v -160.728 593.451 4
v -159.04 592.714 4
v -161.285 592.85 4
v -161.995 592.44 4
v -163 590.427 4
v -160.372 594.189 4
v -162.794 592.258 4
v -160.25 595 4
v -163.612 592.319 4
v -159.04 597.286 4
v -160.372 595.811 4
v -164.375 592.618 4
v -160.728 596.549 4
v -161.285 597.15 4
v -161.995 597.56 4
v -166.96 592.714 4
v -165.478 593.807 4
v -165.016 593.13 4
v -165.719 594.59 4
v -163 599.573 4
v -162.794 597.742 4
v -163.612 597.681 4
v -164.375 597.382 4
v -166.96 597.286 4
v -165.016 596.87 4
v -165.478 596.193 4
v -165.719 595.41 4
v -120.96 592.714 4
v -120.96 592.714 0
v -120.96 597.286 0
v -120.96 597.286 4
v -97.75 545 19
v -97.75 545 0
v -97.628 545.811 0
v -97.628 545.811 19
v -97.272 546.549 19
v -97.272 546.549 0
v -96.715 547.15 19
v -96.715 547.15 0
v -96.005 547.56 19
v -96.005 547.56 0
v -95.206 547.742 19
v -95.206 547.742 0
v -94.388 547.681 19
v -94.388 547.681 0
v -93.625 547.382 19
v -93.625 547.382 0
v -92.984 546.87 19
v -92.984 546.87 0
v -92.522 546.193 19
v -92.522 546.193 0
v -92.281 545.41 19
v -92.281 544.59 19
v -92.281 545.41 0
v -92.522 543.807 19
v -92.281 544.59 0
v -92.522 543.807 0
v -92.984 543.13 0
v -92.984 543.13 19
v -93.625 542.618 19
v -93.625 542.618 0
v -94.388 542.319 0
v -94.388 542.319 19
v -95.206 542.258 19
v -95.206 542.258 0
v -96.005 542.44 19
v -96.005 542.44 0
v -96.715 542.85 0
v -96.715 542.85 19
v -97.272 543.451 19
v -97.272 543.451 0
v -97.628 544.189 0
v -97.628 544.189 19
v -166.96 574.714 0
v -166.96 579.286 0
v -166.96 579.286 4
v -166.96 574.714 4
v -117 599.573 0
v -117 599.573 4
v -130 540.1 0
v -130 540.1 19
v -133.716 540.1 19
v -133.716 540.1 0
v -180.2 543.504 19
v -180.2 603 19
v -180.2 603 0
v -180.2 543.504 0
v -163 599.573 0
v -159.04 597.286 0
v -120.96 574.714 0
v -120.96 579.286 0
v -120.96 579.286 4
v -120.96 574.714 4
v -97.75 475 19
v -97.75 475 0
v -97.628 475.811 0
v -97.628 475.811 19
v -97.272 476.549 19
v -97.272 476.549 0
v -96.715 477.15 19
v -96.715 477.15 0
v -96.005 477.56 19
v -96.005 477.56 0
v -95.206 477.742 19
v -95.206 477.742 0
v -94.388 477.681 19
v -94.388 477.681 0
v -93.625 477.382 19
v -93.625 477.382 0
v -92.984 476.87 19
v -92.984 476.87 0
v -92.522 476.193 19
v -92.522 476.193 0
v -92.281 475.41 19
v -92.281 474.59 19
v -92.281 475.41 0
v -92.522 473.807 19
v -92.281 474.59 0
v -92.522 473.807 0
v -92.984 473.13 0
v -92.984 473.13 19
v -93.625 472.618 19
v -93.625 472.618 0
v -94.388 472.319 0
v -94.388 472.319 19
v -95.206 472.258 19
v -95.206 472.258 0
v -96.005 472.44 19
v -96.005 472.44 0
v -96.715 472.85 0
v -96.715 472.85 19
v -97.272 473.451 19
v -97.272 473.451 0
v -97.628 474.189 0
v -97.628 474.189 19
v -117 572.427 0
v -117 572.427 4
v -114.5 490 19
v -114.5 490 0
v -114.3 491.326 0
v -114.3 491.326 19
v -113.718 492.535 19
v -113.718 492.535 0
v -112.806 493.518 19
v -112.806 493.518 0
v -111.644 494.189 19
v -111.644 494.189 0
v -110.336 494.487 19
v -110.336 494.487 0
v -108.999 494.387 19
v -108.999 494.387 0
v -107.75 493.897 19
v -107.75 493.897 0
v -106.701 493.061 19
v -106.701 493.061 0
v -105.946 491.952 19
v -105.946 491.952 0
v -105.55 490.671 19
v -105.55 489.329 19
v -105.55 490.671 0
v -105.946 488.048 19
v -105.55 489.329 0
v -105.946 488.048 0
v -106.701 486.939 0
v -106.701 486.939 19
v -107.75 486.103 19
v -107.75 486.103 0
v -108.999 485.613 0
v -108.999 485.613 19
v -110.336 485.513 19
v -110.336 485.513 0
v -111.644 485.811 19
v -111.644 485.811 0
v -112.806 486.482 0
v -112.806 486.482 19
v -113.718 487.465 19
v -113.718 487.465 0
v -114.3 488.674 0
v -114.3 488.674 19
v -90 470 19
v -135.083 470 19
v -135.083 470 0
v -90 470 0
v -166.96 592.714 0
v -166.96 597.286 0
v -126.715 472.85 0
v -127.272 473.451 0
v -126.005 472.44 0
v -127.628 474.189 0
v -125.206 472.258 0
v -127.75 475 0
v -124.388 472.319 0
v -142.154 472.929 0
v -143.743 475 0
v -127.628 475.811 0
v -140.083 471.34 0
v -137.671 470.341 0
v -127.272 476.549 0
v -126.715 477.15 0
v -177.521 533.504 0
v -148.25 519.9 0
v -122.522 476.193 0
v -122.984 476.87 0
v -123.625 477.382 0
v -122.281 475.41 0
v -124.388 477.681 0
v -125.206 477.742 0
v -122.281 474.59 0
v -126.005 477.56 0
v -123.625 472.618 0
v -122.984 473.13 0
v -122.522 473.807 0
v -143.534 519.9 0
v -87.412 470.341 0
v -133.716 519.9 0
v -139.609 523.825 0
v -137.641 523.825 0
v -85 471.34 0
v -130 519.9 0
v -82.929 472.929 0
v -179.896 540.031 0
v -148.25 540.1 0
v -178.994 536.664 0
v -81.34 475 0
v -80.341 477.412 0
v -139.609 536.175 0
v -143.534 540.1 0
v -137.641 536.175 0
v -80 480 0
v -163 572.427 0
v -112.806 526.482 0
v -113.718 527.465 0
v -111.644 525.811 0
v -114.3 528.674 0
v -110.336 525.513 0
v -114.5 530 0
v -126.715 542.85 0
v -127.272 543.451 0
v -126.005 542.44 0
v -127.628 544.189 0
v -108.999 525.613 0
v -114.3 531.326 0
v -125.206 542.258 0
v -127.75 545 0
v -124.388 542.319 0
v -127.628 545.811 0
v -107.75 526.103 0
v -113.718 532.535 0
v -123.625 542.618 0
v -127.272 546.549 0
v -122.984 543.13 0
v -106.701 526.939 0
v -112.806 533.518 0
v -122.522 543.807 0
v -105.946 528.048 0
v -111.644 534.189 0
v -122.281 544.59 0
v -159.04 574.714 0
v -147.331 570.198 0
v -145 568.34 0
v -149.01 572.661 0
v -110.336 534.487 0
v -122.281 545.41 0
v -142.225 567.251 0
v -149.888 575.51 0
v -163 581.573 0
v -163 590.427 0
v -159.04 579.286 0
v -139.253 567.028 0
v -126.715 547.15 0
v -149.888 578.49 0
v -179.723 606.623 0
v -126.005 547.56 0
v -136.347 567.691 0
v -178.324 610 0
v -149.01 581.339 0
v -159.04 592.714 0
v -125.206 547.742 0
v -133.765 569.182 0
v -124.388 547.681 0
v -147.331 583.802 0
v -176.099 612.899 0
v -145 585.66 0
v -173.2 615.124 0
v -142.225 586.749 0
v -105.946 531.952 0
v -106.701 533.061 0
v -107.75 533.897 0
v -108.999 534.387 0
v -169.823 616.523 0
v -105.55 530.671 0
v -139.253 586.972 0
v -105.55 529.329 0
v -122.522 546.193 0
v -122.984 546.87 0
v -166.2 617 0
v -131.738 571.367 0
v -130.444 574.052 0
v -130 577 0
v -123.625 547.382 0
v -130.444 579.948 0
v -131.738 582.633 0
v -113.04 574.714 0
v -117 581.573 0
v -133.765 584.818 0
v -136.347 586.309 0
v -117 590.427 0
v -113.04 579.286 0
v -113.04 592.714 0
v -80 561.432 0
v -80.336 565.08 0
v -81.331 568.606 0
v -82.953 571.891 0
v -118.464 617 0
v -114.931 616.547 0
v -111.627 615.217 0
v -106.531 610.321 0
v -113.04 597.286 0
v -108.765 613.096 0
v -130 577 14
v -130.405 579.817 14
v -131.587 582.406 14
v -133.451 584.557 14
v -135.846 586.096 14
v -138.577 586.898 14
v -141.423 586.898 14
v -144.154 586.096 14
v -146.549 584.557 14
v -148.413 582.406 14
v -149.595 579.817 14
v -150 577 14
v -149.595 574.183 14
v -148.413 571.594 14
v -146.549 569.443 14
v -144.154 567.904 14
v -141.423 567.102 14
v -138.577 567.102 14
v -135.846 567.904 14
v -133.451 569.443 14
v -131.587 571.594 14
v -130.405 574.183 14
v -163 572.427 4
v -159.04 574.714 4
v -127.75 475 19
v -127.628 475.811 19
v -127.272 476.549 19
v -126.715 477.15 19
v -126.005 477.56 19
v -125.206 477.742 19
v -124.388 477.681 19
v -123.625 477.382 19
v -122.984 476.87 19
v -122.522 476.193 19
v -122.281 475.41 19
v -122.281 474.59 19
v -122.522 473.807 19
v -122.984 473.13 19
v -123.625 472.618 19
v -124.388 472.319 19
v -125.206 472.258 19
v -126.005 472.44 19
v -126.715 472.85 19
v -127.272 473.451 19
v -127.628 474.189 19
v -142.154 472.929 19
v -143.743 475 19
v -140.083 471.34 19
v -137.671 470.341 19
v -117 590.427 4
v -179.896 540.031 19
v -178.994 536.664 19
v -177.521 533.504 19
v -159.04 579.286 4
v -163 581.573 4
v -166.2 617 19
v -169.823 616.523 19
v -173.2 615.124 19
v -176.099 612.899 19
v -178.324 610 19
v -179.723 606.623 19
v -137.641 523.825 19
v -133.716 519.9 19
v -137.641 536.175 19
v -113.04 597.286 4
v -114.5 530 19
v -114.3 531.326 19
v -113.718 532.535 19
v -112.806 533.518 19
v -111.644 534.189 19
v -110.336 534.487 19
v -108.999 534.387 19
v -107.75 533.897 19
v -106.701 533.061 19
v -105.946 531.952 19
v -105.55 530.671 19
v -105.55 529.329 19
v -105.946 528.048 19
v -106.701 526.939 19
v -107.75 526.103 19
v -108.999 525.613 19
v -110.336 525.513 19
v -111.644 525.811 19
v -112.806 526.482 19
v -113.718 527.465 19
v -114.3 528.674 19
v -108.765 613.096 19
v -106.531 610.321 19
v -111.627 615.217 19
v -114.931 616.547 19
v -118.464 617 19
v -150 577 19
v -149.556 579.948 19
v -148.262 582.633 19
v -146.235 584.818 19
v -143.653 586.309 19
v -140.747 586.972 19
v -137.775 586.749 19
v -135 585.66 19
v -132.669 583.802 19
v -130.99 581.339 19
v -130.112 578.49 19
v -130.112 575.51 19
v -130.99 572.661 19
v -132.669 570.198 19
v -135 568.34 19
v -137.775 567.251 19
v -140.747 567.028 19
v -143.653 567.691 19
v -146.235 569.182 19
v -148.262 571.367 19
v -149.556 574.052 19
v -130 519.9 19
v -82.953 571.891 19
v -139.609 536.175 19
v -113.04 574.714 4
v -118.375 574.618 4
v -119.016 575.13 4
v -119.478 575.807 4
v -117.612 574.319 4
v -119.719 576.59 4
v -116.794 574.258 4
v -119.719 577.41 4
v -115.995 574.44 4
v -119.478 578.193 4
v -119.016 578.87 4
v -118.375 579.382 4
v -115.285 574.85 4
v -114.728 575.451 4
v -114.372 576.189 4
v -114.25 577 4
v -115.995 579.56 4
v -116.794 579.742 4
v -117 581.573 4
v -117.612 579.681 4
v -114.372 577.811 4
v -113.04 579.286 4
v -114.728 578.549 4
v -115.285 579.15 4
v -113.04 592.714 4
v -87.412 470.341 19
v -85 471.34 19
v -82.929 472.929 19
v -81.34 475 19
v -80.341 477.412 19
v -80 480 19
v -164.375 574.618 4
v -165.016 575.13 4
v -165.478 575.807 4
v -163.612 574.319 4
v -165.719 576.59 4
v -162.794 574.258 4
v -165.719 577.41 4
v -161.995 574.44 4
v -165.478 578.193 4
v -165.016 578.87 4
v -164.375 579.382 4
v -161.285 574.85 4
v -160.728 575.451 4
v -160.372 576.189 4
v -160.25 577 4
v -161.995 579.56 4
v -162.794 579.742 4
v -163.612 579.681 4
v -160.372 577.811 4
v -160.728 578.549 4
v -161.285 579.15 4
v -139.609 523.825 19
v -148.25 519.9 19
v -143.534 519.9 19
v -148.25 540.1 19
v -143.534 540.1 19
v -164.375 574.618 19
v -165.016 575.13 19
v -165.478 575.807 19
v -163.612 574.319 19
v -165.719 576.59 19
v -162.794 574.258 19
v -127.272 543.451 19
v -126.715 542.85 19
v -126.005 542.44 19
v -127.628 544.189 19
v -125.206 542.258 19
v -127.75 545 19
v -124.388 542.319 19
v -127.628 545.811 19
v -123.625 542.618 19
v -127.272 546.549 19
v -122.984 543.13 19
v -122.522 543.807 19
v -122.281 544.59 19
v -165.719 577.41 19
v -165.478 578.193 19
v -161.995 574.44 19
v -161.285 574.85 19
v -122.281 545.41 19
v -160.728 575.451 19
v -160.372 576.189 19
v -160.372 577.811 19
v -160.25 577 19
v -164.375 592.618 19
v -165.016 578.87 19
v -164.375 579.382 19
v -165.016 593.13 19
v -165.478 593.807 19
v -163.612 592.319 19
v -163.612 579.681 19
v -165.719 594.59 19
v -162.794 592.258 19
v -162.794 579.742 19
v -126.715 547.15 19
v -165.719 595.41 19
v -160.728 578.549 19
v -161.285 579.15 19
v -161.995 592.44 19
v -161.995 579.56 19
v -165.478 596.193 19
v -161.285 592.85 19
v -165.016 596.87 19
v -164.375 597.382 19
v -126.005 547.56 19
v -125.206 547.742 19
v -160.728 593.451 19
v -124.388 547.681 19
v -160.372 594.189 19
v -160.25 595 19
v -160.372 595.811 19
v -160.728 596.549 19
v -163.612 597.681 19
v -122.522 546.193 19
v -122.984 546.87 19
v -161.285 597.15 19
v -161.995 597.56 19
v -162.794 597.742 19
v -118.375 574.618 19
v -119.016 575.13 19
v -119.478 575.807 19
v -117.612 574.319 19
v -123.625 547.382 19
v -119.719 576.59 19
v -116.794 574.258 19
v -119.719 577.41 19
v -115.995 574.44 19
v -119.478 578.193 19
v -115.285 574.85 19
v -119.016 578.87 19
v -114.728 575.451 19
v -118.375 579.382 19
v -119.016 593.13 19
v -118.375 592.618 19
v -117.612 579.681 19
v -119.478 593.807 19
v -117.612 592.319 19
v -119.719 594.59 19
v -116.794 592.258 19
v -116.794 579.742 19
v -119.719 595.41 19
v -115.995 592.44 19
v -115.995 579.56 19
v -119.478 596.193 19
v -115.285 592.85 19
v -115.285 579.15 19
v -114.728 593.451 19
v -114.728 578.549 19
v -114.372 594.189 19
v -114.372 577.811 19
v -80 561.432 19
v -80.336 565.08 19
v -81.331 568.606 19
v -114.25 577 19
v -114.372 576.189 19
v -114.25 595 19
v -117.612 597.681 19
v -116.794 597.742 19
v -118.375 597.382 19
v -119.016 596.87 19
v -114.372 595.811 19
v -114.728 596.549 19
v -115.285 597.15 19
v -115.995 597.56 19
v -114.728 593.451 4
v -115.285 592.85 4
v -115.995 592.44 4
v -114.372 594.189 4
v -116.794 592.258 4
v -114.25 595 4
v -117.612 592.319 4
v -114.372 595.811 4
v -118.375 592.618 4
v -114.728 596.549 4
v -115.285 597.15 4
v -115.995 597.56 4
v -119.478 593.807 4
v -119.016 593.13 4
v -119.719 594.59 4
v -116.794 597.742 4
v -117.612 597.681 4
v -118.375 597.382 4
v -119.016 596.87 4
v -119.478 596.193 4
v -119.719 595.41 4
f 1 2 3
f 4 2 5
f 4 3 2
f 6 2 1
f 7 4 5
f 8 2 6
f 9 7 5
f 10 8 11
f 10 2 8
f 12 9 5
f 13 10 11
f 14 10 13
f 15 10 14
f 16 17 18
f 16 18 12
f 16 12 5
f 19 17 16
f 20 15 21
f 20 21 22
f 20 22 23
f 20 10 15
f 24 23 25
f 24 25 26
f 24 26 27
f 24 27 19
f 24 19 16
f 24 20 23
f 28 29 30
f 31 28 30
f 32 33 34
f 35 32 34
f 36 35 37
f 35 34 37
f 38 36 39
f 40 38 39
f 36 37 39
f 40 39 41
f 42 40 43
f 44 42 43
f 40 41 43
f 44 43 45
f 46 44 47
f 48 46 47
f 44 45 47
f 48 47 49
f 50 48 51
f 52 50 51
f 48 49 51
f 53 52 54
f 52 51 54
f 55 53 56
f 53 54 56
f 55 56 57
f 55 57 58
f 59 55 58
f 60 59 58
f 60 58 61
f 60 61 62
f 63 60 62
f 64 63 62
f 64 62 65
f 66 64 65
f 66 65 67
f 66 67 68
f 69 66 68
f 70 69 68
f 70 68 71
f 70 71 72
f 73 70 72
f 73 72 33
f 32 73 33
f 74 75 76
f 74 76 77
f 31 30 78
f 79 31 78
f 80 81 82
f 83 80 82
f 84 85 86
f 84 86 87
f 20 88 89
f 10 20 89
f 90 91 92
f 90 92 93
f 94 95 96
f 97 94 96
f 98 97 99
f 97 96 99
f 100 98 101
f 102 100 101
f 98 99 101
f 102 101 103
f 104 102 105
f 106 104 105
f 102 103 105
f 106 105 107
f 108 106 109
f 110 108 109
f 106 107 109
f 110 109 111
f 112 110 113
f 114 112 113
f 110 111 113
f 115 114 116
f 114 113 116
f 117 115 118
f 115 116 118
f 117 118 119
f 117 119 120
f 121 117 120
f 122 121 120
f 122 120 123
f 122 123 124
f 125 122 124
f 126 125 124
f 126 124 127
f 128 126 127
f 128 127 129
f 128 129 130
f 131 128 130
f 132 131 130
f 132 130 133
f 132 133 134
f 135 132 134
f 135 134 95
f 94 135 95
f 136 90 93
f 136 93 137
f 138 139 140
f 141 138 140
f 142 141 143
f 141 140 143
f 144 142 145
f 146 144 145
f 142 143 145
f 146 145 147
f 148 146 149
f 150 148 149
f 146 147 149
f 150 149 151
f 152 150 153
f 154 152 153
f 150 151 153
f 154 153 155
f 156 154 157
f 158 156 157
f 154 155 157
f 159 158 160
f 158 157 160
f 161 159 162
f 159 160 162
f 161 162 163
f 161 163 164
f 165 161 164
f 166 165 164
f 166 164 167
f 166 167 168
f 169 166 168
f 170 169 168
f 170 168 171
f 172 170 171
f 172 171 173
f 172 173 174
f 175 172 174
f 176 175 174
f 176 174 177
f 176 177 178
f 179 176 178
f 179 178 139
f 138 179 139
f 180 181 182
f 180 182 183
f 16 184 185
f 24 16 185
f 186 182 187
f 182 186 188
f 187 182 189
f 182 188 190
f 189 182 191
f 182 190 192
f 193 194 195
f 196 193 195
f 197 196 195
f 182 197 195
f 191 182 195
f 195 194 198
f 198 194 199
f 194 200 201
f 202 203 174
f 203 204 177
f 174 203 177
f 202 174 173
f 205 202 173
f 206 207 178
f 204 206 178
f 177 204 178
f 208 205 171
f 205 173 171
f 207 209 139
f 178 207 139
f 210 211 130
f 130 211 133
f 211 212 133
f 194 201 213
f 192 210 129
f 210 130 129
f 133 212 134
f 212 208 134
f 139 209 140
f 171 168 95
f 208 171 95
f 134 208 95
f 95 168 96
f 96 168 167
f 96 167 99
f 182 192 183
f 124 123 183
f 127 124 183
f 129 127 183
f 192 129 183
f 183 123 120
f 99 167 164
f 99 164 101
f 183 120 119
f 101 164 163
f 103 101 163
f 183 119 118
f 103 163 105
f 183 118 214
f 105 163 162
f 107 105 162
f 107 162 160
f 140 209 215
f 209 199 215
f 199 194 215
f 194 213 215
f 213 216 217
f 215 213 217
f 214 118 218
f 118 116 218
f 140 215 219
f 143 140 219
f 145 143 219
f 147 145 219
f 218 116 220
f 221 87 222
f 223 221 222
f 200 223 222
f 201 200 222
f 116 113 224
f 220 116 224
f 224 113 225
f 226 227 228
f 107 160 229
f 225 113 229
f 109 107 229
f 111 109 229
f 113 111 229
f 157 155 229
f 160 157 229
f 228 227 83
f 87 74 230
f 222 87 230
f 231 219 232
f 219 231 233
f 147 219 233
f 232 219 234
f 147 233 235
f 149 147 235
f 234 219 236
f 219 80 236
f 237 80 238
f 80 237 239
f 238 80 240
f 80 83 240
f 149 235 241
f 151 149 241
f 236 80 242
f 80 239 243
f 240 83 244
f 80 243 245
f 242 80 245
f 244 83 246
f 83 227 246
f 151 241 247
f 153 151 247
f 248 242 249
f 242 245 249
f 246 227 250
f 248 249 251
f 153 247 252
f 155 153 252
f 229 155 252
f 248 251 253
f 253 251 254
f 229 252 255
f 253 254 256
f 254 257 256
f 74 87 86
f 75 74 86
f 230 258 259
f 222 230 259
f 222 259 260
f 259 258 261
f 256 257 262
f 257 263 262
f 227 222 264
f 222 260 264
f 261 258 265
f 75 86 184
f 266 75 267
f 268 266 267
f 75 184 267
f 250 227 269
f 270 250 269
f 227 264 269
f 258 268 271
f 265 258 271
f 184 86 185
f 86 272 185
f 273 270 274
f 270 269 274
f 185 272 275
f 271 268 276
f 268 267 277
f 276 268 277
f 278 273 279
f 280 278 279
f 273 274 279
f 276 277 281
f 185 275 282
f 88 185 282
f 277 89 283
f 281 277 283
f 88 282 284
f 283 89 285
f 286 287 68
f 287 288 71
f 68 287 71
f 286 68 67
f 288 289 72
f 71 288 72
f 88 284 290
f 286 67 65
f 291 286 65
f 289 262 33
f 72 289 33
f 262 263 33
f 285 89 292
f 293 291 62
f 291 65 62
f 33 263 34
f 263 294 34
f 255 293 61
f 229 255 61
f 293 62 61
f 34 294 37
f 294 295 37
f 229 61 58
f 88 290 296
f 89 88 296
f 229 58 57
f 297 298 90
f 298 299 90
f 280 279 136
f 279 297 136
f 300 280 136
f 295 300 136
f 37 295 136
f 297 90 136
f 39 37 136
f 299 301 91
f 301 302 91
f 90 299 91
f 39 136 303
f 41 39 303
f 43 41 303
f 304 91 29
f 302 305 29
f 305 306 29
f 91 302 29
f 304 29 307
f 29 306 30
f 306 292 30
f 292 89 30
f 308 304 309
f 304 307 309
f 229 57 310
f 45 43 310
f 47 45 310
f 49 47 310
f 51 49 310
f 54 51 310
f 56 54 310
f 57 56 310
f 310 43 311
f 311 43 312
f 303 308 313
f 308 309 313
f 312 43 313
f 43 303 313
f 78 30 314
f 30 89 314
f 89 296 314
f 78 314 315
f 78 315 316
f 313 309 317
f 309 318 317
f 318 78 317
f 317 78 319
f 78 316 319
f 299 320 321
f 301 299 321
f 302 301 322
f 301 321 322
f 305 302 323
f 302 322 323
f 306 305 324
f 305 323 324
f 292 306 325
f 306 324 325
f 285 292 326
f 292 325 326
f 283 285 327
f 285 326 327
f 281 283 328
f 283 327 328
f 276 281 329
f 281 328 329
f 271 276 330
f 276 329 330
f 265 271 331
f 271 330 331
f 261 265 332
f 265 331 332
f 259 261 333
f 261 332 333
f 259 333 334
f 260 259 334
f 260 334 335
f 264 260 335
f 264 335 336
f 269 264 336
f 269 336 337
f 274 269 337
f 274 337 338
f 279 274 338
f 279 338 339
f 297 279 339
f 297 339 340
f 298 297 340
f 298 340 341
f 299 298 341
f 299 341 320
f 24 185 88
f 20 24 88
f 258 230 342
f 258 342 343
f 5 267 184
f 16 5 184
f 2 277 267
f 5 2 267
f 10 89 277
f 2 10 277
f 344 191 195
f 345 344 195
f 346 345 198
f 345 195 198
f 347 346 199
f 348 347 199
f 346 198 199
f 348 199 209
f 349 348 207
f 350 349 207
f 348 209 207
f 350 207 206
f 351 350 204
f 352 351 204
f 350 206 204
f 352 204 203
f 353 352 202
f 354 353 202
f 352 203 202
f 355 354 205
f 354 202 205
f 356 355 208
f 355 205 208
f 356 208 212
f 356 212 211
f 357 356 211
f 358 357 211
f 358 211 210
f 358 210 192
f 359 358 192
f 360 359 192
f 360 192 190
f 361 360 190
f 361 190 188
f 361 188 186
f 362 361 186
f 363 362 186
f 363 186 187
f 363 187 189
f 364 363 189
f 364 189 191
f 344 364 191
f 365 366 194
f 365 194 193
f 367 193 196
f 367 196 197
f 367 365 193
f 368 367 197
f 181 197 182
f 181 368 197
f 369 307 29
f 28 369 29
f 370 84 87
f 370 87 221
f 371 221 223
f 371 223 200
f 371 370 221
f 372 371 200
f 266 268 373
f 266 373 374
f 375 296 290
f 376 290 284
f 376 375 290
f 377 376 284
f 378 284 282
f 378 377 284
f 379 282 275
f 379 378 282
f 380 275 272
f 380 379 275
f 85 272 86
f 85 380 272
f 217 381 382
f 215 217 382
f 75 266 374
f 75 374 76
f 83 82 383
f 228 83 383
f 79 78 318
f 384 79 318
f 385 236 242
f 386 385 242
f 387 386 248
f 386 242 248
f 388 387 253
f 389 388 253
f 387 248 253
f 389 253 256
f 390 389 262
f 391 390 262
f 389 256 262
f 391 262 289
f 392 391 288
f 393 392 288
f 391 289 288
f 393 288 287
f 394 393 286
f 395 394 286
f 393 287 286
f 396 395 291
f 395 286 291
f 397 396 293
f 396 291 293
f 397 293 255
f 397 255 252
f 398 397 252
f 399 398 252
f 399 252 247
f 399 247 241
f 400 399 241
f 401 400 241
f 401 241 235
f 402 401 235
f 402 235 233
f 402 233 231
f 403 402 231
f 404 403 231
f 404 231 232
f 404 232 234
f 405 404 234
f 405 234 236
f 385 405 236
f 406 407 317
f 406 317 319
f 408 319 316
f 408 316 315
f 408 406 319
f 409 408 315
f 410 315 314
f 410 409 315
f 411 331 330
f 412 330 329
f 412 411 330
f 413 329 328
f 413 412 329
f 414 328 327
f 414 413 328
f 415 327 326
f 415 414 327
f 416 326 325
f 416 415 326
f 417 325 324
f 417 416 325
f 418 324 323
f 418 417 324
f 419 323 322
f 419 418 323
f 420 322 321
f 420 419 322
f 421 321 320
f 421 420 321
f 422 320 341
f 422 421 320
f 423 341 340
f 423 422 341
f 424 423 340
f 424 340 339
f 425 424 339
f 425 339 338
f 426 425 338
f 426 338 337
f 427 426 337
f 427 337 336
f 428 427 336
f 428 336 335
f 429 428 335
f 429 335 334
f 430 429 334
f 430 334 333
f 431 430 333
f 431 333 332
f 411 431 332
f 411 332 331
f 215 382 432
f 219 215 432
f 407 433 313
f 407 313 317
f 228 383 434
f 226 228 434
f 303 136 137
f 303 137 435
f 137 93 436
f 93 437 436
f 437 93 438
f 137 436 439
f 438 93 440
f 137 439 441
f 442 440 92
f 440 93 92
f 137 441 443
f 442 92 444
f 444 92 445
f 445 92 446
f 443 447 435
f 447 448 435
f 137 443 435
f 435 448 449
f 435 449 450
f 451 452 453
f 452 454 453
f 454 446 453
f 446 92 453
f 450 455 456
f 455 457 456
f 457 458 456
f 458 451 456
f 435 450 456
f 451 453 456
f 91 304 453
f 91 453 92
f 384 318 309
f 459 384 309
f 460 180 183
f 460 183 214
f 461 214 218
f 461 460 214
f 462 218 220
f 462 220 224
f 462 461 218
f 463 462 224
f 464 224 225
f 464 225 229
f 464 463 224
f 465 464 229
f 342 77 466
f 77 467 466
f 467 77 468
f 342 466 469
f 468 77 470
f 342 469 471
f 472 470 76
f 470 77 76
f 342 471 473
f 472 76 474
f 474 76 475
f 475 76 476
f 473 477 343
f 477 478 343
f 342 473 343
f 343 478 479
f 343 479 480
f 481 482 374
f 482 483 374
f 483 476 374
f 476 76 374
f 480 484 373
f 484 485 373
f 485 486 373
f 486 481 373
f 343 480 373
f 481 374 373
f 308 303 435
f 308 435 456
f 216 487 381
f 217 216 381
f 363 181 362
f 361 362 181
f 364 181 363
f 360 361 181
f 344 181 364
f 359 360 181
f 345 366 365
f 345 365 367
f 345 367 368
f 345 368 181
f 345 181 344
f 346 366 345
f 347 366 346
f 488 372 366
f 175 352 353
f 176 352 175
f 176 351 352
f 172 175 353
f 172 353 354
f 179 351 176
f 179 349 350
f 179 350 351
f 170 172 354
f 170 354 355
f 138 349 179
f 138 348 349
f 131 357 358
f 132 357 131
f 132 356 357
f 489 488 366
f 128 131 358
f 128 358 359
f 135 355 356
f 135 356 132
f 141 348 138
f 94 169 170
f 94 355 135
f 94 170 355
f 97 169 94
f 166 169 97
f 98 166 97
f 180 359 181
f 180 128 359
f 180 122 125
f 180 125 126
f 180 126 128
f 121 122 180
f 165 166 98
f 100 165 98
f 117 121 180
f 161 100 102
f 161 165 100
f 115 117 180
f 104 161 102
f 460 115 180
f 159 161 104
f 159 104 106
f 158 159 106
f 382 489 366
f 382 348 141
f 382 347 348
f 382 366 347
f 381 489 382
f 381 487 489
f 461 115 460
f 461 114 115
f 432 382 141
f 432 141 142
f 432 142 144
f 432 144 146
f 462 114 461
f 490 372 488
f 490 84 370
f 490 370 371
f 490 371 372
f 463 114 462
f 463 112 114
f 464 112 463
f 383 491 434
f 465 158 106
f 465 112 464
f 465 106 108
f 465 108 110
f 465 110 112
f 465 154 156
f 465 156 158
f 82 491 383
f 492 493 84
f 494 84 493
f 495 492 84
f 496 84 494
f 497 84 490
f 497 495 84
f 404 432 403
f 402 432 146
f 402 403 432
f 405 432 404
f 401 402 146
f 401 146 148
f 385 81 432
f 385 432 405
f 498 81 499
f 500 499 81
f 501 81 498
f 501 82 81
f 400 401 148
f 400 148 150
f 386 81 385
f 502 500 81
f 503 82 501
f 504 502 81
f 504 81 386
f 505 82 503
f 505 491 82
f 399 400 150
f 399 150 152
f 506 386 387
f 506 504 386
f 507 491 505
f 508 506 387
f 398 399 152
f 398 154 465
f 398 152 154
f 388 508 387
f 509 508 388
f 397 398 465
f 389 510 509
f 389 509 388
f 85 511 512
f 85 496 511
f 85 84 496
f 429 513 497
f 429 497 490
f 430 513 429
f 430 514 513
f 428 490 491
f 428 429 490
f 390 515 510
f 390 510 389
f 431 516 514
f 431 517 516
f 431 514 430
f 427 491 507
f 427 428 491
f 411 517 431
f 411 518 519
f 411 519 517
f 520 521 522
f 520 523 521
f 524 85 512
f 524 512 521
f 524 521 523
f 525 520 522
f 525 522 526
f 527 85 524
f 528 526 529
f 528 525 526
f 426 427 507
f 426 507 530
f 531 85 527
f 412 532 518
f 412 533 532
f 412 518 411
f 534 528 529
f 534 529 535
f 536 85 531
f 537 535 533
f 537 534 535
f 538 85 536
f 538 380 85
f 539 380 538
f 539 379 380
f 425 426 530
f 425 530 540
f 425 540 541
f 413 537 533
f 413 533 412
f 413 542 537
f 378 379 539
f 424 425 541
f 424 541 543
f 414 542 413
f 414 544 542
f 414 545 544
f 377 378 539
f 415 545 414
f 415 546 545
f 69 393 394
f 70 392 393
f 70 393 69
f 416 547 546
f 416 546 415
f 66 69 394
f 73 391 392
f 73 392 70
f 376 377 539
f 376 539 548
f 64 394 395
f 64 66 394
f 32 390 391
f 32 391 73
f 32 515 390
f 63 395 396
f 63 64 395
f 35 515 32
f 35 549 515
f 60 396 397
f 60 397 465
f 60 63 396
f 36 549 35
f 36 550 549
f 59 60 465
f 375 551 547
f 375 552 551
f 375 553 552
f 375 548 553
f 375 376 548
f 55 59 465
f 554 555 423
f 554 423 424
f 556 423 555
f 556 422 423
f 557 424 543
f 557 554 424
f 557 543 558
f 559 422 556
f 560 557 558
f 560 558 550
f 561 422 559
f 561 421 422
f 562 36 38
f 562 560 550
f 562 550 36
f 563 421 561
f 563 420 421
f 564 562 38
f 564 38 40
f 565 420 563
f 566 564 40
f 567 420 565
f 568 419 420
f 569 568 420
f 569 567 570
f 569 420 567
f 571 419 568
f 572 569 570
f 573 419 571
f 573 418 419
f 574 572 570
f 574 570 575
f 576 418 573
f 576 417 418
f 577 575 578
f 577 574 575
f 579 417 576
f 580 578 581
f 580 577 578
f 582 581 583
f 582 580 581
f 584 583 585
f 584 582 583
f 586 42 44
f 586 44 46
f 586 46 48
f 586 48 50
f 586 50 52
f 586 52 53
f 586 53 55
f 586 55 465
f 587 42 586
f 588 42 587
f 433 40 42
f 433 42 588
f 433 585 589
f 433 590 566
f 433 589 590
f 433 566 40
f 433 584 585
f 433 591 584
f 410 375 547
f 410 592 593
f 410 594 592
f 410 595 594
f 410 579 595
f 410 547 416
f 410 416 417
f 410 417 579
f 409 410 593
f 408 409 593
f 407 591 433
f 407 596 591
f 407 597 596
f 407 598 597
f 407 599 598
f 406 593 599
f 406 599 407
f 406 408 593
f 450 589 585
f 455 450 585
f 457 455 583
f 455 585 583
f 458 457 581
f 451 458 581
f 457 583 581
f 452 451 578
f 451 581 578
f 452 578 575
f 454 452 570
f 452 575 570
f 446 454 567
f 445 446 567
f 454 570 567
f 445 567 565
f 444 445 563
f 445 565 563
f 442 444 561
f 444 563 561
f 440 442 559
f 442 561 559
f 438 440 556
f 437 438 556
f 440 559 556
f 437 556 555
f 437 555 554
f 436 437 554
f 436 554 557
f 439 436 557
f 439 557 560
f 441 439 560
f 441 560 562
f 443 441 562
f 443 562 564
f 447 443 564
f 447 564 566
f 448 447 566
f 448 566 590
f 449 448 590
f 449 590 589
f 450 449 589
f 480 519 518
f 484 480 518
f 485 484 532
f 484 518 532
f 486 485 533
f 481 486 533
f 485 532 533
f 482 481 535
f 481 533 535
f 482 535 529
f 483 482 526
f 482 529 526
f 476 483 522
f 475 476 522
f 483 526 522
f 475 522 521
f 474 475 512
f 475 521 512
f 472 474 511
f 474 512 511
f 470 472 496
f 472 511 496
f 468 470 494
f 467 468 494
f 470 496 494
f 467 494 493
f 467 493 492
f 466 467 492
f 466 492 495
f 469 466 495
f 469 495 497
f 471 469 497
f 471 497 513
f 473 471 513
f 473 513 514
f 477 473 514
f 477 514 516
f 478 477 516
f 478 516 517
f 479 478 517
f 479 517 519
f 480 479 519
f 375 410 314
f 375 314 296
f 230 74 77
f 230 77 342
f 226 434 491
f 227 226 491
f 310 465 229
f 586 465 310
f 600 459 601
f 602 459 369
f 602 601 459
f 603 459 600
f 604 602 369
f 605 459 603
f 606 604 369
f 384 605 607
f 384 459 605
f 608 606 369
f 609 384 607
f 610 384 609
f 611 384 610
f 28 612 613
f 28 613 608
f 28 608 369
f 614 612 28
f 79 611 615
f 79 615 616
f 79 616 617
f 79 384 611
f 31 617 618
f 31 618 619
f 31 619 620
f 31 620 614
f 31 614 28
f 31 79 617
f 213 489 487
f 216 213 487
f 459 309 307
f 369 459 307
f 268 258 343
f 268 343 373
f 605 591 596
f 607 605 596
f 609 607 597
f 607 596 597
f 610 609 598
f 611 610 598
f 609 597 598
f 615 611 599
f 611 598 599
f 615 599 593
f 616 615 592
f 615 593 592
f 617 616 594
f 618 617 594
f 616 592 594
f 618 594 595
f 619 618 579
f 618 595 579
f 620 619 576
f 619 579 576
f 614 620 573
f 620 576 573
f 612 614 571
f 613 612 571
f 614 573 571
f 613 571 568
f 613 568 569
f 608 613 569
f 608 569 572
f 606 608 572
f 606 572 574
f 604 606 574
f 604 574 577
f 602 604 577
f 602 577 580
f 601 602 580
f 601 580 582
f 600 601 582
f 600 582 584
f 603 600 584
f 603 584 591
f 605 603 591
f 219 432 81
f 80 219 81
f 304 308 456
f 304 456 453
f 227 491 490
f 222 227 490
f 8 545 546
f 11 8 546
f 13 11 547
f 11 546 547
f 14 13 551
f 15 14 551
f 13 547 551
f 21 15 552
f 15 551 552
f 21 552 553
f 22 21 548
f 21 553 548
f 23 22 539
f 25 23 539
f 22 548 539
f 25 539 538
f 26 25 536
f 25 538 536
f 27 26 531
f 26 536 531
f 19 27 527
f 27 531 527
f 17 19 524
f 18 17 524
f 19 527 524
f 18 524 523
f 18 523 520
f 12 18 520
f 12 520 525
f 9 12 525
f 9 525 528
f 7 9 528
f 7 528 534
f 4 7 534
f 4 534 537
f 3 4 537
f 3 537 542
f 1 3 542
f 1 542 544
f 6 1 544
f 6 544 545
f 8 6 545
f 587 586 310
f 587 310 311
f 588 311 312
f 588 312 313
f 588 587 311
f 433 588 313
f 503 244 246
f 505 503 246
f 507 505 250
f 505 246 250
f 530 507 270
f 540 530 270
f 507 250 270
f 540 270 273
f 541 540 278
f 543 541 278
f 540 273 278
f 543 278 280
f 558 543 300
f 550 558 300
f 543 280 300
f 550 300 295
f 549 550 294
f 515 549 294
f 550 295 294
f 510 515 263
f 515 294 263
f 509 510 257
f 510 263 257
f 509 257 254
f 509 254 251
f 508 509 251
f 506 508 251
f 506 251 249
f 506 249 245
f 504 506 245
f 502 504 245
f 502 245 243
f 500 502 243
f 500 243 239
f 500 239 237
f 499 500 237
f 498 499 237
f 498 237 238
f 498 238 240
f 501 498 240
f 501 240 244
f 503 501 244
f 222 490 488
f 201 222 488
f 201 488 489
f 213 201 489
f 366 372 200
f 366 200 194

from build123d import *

# Parameters (mm, degrees)
BOSS_EXTRUDE1_DEPTH  = 19
FILLET1_R            = 10
M5_CLEARANCE_HOLE2_D = 5.5
M5_CLEARANCE_HOLE1_D = 5.5
FILLET2_R            = 4
BOSS_EXTRUDE2_DEPTH  = 19
M8_CLEARANCE_HOLE1_D = 9
CUT_EXTRUDE2_DEPTH   = 4
SKETCH16_R           = 10
CUT_EXTRUDE3_DEPTH   = 5
CUT_EXTRUDE4_DEPTH   = 20
SKETCH19_R           = 10
CUT_EXTRUDE5_DEPTH   = 20


with BuildPart() as part:
    # Sketch1 → Boss-Extrude1 (new body)
    with BuildSketch(Plane.XY):
        with BuildLine():
            Line((-170.200000001, 540.824594888), (-129.309401077, 470))
            Line((-129.309401077, 470), (-93, 470))
            ThreePointArc((-93, 470), (-90.878679656, 470.878679656), (-90, 473))
            Line((-90, 473), (-90, 564.25527297))
            Line((-90, 564.25527297), (-116.225329238, 607))
            Line((-116.225329238, 607), (-170.200000001, 607))
            Line((-170.200000001, 607), (-170.200000001, 540.824594888))
        make_face()
    extrude(amount=BOSS_EXTRUDE1_DEPTH)

    # Fillet1
    fillet1_edges = [part.edges().sort_by_distance(p)[0] for p in [
        (-90, 564.25527297, 9.5),
        (-129.309401077, 470, 9.5),
        (-170.200000001, 540.824594888, 9.5),
    ]]
    fillet(fillet1_edges, radius=FILLET1_R)

    # M5 Clearance Hole2 (through all)
    with Locations(Plane(origin=(0, 0, 0), x_dir=(-1, 0, 0), z_dir=(0, 0, -1))):
        with Locations((117.000000001, 595), (117.000000001, 577), (163.000000001, 577), (163.000000001, 595)):
            Hole(M5_CLEARANCE_HOLE2_D / 2)

    # M5 Clearance Hole1 (through all)
    with Locations(Plane.XY.offset(19)):
        with Locations((-95, 545), (-125, 545), (-125, 475), (-95, 475), (-110, 490), (-110, 530)):
            Hole(M5_CLEARANCE_HOLE1_D / 2)

    # Fillet2
    fillet2_edges = [part.edges().sort_by_distance(p)[0] for p in [
        (-116.225329238, 607, 9.5),
        (-170.200000001, 607, 9.5),
    ]]
    fillet(fillet2_edges, radius=FILLET2_R)

    # Sketch11 → Boss-Extrude2 (add)
    with BuildSketch(Plane.XY.offset(19)):
        with BuildLine():
            ThreePointArc((-143.743157806, 475), (-140.082903769, 471.339745962), (-135.082903769, 470))
            Line((-135.082903769, 470), (-123.535898385, 470))
            ThreePointArc((-123.535898385, 470), (-128.535898385, 471.339745962), (-132.196152423, 475))
            Line((-132.196152423, 475), (-168.860254039, 538.504086813))
            ThreePointArc((-168.860254039, 538.504086813), (-169.859258264, 540.915896362), (-170.200000001, 543.504086813))
            Line((-170.200000001, 543.504086813), (-170.200000001, 603))
            ThreePointArc((-170.200000001, 603), (-169.028427125, 605.828427125), (-166.200000001, 607))
            Line((-166.200000001, 607), (-118.464037729, 607))
            ThreePointArc((-118.464037729, 607), (-116.510482263, 606.490504411), (-115.054590744, 605.091810521))
            Line((-115.054590744, 605.091810521), (-91.476382537, 566.661632408))
            ThreePointArc((-91.476382537, 566.661632408), (-90.37617086, 564.149073659), (-90, 561.432106106))
            Line((-90, 561.432106106), (-90, 473))
            ThreePointArc((-90, 473), (-90.878679656, 470.878679656), (-93, 470))
            Line((-93, 470), (-90, 470))
            ThreePointArc((-90, 470), (-82.928932188, 472.928932188), (-80, 480))
            Line((-80, 480), (-80, 561.432106106))
            ThreePointArc((-80, 561.432106106), (-80.75234172, 566.866041212), (-82.952765074, 571.89115871))
            Line((-82.952765074, 571.89115871), (-106.530973281, 610.321336823))
            ThreePointArc((-106.530973281, 610.321336823), (-111.626593598, 615.216765438), (-118.464037729, 617))
            Line((-118.464037729, 617), (-166.200000001, 617))
            ThreePointArc((-166.200000001, 617), (-176.099494937, 612.899494937), (-180.200000001, 603))
            Line((-180.200000001, 603), (-180.200000001, 543.504086813))
            ThreePointArc((-180.200000001, 543.504086813), (-179.518516526, 538.327705911), (-177.520508076, 533.504086813))
            Line((-177.520508076, 533.504086813), (-143.743157806, 475))
        make_face()
    extrude(amount=-BOSS_EXTRUDE2_DEPTH)

    # M8 Clearance Hole1 (through all)
    with Locations(Plane.XY.offset(19)):
        with Locations((-110, 530), (-110, 490)):
            Hole(M8_CLEARANCE_HOLE1_D / 2)

    # Sketch15 → Cut-Extrude2 (cut)
    with BuildSketch(Plane.XY):
        Polygon((-166.960000001, 579.286307066), (-166.960000001, 574.713692934), (-163.000000001, 572.427385868), (-159.040000001, 574.713692934), (-159.040000001, 579.286307066), (-163.000000001, 581.572614132), align=None)
        Polygon((-120.960000001, 579.286307066), (-120.960000001, 574.713692934), (-117.000000001, 572.427385868), (-113.040000001, 574.713692934), (-113.040000001, 579.286307066), (-117.000000001, 581.572614132), align=None)
        Polygon((-113.040000001, 592.713692934), (-117.000000001, 590.427385868), (-120.960000001, 592.713692934), (-120.960000001, 597.286307066), (-117.000000001, 599.572614132), (-113.040000001, 597.286307066), align=None)
        Polygon((-163.000000001, 590.427385868), (-166.960000001, 592.713692934), (-166.960000001, 597.286307066), (-163.000000001, 599.572614132), (-159.040000001, 597.286307066), (-159.040000001, 592.713692934), align=None)
    extrude(amount=CUT_EXTRUDE2_DEPTH, mode=Mode.SUBTRACT)

    # Sketch16 → Cut-Extrude3 (cut)
    with BuildSketch(Plane(origin=(0, 0, 19), x_dir=(-1, 0, 0), z_dir=(0, 0, -1))):
        with Locations((140.000000001, 577)):
            Circle(SKETCH16_R)
    extrude(amount=CUT_EXTRUDE3_DEPTH, mode=Mode.SUBTRACT)

    # Sketch18 → Cut-Extrude4 (cut)
    with BuildSketch(Plane.XY.offset(19)):
        Polygon((-130, 540.1), (-133.716421356, 540.1), (-137.641421356, 536.175), (-139.608578644, 536.175), (-143.533578644, 540.1), (-148.25, 540.1), (-148.25, 519.9), (-143.533578644, 519.9), (-139.608578644, 523.825), (-137.641421356, 523.825), (-133.716421356, 519.9), (-130, 519.9), align=None)
    extrude(amount=-CUT_EXTRUDE4_DEPTH, mode=Mode.SUBTRACT)

    # Sketch19 → Cut-Extrude5 (cut)
    with BuildSketch(Plane.XY.offset(14)):
        with Locations((-140.000000001, 577)):
            Circle(SKETCH19_R)
    extrude(amount=-CUT_EXTRUDE5_DEPTH, mode=Mode.SUBTRACT)


solid = part.part
